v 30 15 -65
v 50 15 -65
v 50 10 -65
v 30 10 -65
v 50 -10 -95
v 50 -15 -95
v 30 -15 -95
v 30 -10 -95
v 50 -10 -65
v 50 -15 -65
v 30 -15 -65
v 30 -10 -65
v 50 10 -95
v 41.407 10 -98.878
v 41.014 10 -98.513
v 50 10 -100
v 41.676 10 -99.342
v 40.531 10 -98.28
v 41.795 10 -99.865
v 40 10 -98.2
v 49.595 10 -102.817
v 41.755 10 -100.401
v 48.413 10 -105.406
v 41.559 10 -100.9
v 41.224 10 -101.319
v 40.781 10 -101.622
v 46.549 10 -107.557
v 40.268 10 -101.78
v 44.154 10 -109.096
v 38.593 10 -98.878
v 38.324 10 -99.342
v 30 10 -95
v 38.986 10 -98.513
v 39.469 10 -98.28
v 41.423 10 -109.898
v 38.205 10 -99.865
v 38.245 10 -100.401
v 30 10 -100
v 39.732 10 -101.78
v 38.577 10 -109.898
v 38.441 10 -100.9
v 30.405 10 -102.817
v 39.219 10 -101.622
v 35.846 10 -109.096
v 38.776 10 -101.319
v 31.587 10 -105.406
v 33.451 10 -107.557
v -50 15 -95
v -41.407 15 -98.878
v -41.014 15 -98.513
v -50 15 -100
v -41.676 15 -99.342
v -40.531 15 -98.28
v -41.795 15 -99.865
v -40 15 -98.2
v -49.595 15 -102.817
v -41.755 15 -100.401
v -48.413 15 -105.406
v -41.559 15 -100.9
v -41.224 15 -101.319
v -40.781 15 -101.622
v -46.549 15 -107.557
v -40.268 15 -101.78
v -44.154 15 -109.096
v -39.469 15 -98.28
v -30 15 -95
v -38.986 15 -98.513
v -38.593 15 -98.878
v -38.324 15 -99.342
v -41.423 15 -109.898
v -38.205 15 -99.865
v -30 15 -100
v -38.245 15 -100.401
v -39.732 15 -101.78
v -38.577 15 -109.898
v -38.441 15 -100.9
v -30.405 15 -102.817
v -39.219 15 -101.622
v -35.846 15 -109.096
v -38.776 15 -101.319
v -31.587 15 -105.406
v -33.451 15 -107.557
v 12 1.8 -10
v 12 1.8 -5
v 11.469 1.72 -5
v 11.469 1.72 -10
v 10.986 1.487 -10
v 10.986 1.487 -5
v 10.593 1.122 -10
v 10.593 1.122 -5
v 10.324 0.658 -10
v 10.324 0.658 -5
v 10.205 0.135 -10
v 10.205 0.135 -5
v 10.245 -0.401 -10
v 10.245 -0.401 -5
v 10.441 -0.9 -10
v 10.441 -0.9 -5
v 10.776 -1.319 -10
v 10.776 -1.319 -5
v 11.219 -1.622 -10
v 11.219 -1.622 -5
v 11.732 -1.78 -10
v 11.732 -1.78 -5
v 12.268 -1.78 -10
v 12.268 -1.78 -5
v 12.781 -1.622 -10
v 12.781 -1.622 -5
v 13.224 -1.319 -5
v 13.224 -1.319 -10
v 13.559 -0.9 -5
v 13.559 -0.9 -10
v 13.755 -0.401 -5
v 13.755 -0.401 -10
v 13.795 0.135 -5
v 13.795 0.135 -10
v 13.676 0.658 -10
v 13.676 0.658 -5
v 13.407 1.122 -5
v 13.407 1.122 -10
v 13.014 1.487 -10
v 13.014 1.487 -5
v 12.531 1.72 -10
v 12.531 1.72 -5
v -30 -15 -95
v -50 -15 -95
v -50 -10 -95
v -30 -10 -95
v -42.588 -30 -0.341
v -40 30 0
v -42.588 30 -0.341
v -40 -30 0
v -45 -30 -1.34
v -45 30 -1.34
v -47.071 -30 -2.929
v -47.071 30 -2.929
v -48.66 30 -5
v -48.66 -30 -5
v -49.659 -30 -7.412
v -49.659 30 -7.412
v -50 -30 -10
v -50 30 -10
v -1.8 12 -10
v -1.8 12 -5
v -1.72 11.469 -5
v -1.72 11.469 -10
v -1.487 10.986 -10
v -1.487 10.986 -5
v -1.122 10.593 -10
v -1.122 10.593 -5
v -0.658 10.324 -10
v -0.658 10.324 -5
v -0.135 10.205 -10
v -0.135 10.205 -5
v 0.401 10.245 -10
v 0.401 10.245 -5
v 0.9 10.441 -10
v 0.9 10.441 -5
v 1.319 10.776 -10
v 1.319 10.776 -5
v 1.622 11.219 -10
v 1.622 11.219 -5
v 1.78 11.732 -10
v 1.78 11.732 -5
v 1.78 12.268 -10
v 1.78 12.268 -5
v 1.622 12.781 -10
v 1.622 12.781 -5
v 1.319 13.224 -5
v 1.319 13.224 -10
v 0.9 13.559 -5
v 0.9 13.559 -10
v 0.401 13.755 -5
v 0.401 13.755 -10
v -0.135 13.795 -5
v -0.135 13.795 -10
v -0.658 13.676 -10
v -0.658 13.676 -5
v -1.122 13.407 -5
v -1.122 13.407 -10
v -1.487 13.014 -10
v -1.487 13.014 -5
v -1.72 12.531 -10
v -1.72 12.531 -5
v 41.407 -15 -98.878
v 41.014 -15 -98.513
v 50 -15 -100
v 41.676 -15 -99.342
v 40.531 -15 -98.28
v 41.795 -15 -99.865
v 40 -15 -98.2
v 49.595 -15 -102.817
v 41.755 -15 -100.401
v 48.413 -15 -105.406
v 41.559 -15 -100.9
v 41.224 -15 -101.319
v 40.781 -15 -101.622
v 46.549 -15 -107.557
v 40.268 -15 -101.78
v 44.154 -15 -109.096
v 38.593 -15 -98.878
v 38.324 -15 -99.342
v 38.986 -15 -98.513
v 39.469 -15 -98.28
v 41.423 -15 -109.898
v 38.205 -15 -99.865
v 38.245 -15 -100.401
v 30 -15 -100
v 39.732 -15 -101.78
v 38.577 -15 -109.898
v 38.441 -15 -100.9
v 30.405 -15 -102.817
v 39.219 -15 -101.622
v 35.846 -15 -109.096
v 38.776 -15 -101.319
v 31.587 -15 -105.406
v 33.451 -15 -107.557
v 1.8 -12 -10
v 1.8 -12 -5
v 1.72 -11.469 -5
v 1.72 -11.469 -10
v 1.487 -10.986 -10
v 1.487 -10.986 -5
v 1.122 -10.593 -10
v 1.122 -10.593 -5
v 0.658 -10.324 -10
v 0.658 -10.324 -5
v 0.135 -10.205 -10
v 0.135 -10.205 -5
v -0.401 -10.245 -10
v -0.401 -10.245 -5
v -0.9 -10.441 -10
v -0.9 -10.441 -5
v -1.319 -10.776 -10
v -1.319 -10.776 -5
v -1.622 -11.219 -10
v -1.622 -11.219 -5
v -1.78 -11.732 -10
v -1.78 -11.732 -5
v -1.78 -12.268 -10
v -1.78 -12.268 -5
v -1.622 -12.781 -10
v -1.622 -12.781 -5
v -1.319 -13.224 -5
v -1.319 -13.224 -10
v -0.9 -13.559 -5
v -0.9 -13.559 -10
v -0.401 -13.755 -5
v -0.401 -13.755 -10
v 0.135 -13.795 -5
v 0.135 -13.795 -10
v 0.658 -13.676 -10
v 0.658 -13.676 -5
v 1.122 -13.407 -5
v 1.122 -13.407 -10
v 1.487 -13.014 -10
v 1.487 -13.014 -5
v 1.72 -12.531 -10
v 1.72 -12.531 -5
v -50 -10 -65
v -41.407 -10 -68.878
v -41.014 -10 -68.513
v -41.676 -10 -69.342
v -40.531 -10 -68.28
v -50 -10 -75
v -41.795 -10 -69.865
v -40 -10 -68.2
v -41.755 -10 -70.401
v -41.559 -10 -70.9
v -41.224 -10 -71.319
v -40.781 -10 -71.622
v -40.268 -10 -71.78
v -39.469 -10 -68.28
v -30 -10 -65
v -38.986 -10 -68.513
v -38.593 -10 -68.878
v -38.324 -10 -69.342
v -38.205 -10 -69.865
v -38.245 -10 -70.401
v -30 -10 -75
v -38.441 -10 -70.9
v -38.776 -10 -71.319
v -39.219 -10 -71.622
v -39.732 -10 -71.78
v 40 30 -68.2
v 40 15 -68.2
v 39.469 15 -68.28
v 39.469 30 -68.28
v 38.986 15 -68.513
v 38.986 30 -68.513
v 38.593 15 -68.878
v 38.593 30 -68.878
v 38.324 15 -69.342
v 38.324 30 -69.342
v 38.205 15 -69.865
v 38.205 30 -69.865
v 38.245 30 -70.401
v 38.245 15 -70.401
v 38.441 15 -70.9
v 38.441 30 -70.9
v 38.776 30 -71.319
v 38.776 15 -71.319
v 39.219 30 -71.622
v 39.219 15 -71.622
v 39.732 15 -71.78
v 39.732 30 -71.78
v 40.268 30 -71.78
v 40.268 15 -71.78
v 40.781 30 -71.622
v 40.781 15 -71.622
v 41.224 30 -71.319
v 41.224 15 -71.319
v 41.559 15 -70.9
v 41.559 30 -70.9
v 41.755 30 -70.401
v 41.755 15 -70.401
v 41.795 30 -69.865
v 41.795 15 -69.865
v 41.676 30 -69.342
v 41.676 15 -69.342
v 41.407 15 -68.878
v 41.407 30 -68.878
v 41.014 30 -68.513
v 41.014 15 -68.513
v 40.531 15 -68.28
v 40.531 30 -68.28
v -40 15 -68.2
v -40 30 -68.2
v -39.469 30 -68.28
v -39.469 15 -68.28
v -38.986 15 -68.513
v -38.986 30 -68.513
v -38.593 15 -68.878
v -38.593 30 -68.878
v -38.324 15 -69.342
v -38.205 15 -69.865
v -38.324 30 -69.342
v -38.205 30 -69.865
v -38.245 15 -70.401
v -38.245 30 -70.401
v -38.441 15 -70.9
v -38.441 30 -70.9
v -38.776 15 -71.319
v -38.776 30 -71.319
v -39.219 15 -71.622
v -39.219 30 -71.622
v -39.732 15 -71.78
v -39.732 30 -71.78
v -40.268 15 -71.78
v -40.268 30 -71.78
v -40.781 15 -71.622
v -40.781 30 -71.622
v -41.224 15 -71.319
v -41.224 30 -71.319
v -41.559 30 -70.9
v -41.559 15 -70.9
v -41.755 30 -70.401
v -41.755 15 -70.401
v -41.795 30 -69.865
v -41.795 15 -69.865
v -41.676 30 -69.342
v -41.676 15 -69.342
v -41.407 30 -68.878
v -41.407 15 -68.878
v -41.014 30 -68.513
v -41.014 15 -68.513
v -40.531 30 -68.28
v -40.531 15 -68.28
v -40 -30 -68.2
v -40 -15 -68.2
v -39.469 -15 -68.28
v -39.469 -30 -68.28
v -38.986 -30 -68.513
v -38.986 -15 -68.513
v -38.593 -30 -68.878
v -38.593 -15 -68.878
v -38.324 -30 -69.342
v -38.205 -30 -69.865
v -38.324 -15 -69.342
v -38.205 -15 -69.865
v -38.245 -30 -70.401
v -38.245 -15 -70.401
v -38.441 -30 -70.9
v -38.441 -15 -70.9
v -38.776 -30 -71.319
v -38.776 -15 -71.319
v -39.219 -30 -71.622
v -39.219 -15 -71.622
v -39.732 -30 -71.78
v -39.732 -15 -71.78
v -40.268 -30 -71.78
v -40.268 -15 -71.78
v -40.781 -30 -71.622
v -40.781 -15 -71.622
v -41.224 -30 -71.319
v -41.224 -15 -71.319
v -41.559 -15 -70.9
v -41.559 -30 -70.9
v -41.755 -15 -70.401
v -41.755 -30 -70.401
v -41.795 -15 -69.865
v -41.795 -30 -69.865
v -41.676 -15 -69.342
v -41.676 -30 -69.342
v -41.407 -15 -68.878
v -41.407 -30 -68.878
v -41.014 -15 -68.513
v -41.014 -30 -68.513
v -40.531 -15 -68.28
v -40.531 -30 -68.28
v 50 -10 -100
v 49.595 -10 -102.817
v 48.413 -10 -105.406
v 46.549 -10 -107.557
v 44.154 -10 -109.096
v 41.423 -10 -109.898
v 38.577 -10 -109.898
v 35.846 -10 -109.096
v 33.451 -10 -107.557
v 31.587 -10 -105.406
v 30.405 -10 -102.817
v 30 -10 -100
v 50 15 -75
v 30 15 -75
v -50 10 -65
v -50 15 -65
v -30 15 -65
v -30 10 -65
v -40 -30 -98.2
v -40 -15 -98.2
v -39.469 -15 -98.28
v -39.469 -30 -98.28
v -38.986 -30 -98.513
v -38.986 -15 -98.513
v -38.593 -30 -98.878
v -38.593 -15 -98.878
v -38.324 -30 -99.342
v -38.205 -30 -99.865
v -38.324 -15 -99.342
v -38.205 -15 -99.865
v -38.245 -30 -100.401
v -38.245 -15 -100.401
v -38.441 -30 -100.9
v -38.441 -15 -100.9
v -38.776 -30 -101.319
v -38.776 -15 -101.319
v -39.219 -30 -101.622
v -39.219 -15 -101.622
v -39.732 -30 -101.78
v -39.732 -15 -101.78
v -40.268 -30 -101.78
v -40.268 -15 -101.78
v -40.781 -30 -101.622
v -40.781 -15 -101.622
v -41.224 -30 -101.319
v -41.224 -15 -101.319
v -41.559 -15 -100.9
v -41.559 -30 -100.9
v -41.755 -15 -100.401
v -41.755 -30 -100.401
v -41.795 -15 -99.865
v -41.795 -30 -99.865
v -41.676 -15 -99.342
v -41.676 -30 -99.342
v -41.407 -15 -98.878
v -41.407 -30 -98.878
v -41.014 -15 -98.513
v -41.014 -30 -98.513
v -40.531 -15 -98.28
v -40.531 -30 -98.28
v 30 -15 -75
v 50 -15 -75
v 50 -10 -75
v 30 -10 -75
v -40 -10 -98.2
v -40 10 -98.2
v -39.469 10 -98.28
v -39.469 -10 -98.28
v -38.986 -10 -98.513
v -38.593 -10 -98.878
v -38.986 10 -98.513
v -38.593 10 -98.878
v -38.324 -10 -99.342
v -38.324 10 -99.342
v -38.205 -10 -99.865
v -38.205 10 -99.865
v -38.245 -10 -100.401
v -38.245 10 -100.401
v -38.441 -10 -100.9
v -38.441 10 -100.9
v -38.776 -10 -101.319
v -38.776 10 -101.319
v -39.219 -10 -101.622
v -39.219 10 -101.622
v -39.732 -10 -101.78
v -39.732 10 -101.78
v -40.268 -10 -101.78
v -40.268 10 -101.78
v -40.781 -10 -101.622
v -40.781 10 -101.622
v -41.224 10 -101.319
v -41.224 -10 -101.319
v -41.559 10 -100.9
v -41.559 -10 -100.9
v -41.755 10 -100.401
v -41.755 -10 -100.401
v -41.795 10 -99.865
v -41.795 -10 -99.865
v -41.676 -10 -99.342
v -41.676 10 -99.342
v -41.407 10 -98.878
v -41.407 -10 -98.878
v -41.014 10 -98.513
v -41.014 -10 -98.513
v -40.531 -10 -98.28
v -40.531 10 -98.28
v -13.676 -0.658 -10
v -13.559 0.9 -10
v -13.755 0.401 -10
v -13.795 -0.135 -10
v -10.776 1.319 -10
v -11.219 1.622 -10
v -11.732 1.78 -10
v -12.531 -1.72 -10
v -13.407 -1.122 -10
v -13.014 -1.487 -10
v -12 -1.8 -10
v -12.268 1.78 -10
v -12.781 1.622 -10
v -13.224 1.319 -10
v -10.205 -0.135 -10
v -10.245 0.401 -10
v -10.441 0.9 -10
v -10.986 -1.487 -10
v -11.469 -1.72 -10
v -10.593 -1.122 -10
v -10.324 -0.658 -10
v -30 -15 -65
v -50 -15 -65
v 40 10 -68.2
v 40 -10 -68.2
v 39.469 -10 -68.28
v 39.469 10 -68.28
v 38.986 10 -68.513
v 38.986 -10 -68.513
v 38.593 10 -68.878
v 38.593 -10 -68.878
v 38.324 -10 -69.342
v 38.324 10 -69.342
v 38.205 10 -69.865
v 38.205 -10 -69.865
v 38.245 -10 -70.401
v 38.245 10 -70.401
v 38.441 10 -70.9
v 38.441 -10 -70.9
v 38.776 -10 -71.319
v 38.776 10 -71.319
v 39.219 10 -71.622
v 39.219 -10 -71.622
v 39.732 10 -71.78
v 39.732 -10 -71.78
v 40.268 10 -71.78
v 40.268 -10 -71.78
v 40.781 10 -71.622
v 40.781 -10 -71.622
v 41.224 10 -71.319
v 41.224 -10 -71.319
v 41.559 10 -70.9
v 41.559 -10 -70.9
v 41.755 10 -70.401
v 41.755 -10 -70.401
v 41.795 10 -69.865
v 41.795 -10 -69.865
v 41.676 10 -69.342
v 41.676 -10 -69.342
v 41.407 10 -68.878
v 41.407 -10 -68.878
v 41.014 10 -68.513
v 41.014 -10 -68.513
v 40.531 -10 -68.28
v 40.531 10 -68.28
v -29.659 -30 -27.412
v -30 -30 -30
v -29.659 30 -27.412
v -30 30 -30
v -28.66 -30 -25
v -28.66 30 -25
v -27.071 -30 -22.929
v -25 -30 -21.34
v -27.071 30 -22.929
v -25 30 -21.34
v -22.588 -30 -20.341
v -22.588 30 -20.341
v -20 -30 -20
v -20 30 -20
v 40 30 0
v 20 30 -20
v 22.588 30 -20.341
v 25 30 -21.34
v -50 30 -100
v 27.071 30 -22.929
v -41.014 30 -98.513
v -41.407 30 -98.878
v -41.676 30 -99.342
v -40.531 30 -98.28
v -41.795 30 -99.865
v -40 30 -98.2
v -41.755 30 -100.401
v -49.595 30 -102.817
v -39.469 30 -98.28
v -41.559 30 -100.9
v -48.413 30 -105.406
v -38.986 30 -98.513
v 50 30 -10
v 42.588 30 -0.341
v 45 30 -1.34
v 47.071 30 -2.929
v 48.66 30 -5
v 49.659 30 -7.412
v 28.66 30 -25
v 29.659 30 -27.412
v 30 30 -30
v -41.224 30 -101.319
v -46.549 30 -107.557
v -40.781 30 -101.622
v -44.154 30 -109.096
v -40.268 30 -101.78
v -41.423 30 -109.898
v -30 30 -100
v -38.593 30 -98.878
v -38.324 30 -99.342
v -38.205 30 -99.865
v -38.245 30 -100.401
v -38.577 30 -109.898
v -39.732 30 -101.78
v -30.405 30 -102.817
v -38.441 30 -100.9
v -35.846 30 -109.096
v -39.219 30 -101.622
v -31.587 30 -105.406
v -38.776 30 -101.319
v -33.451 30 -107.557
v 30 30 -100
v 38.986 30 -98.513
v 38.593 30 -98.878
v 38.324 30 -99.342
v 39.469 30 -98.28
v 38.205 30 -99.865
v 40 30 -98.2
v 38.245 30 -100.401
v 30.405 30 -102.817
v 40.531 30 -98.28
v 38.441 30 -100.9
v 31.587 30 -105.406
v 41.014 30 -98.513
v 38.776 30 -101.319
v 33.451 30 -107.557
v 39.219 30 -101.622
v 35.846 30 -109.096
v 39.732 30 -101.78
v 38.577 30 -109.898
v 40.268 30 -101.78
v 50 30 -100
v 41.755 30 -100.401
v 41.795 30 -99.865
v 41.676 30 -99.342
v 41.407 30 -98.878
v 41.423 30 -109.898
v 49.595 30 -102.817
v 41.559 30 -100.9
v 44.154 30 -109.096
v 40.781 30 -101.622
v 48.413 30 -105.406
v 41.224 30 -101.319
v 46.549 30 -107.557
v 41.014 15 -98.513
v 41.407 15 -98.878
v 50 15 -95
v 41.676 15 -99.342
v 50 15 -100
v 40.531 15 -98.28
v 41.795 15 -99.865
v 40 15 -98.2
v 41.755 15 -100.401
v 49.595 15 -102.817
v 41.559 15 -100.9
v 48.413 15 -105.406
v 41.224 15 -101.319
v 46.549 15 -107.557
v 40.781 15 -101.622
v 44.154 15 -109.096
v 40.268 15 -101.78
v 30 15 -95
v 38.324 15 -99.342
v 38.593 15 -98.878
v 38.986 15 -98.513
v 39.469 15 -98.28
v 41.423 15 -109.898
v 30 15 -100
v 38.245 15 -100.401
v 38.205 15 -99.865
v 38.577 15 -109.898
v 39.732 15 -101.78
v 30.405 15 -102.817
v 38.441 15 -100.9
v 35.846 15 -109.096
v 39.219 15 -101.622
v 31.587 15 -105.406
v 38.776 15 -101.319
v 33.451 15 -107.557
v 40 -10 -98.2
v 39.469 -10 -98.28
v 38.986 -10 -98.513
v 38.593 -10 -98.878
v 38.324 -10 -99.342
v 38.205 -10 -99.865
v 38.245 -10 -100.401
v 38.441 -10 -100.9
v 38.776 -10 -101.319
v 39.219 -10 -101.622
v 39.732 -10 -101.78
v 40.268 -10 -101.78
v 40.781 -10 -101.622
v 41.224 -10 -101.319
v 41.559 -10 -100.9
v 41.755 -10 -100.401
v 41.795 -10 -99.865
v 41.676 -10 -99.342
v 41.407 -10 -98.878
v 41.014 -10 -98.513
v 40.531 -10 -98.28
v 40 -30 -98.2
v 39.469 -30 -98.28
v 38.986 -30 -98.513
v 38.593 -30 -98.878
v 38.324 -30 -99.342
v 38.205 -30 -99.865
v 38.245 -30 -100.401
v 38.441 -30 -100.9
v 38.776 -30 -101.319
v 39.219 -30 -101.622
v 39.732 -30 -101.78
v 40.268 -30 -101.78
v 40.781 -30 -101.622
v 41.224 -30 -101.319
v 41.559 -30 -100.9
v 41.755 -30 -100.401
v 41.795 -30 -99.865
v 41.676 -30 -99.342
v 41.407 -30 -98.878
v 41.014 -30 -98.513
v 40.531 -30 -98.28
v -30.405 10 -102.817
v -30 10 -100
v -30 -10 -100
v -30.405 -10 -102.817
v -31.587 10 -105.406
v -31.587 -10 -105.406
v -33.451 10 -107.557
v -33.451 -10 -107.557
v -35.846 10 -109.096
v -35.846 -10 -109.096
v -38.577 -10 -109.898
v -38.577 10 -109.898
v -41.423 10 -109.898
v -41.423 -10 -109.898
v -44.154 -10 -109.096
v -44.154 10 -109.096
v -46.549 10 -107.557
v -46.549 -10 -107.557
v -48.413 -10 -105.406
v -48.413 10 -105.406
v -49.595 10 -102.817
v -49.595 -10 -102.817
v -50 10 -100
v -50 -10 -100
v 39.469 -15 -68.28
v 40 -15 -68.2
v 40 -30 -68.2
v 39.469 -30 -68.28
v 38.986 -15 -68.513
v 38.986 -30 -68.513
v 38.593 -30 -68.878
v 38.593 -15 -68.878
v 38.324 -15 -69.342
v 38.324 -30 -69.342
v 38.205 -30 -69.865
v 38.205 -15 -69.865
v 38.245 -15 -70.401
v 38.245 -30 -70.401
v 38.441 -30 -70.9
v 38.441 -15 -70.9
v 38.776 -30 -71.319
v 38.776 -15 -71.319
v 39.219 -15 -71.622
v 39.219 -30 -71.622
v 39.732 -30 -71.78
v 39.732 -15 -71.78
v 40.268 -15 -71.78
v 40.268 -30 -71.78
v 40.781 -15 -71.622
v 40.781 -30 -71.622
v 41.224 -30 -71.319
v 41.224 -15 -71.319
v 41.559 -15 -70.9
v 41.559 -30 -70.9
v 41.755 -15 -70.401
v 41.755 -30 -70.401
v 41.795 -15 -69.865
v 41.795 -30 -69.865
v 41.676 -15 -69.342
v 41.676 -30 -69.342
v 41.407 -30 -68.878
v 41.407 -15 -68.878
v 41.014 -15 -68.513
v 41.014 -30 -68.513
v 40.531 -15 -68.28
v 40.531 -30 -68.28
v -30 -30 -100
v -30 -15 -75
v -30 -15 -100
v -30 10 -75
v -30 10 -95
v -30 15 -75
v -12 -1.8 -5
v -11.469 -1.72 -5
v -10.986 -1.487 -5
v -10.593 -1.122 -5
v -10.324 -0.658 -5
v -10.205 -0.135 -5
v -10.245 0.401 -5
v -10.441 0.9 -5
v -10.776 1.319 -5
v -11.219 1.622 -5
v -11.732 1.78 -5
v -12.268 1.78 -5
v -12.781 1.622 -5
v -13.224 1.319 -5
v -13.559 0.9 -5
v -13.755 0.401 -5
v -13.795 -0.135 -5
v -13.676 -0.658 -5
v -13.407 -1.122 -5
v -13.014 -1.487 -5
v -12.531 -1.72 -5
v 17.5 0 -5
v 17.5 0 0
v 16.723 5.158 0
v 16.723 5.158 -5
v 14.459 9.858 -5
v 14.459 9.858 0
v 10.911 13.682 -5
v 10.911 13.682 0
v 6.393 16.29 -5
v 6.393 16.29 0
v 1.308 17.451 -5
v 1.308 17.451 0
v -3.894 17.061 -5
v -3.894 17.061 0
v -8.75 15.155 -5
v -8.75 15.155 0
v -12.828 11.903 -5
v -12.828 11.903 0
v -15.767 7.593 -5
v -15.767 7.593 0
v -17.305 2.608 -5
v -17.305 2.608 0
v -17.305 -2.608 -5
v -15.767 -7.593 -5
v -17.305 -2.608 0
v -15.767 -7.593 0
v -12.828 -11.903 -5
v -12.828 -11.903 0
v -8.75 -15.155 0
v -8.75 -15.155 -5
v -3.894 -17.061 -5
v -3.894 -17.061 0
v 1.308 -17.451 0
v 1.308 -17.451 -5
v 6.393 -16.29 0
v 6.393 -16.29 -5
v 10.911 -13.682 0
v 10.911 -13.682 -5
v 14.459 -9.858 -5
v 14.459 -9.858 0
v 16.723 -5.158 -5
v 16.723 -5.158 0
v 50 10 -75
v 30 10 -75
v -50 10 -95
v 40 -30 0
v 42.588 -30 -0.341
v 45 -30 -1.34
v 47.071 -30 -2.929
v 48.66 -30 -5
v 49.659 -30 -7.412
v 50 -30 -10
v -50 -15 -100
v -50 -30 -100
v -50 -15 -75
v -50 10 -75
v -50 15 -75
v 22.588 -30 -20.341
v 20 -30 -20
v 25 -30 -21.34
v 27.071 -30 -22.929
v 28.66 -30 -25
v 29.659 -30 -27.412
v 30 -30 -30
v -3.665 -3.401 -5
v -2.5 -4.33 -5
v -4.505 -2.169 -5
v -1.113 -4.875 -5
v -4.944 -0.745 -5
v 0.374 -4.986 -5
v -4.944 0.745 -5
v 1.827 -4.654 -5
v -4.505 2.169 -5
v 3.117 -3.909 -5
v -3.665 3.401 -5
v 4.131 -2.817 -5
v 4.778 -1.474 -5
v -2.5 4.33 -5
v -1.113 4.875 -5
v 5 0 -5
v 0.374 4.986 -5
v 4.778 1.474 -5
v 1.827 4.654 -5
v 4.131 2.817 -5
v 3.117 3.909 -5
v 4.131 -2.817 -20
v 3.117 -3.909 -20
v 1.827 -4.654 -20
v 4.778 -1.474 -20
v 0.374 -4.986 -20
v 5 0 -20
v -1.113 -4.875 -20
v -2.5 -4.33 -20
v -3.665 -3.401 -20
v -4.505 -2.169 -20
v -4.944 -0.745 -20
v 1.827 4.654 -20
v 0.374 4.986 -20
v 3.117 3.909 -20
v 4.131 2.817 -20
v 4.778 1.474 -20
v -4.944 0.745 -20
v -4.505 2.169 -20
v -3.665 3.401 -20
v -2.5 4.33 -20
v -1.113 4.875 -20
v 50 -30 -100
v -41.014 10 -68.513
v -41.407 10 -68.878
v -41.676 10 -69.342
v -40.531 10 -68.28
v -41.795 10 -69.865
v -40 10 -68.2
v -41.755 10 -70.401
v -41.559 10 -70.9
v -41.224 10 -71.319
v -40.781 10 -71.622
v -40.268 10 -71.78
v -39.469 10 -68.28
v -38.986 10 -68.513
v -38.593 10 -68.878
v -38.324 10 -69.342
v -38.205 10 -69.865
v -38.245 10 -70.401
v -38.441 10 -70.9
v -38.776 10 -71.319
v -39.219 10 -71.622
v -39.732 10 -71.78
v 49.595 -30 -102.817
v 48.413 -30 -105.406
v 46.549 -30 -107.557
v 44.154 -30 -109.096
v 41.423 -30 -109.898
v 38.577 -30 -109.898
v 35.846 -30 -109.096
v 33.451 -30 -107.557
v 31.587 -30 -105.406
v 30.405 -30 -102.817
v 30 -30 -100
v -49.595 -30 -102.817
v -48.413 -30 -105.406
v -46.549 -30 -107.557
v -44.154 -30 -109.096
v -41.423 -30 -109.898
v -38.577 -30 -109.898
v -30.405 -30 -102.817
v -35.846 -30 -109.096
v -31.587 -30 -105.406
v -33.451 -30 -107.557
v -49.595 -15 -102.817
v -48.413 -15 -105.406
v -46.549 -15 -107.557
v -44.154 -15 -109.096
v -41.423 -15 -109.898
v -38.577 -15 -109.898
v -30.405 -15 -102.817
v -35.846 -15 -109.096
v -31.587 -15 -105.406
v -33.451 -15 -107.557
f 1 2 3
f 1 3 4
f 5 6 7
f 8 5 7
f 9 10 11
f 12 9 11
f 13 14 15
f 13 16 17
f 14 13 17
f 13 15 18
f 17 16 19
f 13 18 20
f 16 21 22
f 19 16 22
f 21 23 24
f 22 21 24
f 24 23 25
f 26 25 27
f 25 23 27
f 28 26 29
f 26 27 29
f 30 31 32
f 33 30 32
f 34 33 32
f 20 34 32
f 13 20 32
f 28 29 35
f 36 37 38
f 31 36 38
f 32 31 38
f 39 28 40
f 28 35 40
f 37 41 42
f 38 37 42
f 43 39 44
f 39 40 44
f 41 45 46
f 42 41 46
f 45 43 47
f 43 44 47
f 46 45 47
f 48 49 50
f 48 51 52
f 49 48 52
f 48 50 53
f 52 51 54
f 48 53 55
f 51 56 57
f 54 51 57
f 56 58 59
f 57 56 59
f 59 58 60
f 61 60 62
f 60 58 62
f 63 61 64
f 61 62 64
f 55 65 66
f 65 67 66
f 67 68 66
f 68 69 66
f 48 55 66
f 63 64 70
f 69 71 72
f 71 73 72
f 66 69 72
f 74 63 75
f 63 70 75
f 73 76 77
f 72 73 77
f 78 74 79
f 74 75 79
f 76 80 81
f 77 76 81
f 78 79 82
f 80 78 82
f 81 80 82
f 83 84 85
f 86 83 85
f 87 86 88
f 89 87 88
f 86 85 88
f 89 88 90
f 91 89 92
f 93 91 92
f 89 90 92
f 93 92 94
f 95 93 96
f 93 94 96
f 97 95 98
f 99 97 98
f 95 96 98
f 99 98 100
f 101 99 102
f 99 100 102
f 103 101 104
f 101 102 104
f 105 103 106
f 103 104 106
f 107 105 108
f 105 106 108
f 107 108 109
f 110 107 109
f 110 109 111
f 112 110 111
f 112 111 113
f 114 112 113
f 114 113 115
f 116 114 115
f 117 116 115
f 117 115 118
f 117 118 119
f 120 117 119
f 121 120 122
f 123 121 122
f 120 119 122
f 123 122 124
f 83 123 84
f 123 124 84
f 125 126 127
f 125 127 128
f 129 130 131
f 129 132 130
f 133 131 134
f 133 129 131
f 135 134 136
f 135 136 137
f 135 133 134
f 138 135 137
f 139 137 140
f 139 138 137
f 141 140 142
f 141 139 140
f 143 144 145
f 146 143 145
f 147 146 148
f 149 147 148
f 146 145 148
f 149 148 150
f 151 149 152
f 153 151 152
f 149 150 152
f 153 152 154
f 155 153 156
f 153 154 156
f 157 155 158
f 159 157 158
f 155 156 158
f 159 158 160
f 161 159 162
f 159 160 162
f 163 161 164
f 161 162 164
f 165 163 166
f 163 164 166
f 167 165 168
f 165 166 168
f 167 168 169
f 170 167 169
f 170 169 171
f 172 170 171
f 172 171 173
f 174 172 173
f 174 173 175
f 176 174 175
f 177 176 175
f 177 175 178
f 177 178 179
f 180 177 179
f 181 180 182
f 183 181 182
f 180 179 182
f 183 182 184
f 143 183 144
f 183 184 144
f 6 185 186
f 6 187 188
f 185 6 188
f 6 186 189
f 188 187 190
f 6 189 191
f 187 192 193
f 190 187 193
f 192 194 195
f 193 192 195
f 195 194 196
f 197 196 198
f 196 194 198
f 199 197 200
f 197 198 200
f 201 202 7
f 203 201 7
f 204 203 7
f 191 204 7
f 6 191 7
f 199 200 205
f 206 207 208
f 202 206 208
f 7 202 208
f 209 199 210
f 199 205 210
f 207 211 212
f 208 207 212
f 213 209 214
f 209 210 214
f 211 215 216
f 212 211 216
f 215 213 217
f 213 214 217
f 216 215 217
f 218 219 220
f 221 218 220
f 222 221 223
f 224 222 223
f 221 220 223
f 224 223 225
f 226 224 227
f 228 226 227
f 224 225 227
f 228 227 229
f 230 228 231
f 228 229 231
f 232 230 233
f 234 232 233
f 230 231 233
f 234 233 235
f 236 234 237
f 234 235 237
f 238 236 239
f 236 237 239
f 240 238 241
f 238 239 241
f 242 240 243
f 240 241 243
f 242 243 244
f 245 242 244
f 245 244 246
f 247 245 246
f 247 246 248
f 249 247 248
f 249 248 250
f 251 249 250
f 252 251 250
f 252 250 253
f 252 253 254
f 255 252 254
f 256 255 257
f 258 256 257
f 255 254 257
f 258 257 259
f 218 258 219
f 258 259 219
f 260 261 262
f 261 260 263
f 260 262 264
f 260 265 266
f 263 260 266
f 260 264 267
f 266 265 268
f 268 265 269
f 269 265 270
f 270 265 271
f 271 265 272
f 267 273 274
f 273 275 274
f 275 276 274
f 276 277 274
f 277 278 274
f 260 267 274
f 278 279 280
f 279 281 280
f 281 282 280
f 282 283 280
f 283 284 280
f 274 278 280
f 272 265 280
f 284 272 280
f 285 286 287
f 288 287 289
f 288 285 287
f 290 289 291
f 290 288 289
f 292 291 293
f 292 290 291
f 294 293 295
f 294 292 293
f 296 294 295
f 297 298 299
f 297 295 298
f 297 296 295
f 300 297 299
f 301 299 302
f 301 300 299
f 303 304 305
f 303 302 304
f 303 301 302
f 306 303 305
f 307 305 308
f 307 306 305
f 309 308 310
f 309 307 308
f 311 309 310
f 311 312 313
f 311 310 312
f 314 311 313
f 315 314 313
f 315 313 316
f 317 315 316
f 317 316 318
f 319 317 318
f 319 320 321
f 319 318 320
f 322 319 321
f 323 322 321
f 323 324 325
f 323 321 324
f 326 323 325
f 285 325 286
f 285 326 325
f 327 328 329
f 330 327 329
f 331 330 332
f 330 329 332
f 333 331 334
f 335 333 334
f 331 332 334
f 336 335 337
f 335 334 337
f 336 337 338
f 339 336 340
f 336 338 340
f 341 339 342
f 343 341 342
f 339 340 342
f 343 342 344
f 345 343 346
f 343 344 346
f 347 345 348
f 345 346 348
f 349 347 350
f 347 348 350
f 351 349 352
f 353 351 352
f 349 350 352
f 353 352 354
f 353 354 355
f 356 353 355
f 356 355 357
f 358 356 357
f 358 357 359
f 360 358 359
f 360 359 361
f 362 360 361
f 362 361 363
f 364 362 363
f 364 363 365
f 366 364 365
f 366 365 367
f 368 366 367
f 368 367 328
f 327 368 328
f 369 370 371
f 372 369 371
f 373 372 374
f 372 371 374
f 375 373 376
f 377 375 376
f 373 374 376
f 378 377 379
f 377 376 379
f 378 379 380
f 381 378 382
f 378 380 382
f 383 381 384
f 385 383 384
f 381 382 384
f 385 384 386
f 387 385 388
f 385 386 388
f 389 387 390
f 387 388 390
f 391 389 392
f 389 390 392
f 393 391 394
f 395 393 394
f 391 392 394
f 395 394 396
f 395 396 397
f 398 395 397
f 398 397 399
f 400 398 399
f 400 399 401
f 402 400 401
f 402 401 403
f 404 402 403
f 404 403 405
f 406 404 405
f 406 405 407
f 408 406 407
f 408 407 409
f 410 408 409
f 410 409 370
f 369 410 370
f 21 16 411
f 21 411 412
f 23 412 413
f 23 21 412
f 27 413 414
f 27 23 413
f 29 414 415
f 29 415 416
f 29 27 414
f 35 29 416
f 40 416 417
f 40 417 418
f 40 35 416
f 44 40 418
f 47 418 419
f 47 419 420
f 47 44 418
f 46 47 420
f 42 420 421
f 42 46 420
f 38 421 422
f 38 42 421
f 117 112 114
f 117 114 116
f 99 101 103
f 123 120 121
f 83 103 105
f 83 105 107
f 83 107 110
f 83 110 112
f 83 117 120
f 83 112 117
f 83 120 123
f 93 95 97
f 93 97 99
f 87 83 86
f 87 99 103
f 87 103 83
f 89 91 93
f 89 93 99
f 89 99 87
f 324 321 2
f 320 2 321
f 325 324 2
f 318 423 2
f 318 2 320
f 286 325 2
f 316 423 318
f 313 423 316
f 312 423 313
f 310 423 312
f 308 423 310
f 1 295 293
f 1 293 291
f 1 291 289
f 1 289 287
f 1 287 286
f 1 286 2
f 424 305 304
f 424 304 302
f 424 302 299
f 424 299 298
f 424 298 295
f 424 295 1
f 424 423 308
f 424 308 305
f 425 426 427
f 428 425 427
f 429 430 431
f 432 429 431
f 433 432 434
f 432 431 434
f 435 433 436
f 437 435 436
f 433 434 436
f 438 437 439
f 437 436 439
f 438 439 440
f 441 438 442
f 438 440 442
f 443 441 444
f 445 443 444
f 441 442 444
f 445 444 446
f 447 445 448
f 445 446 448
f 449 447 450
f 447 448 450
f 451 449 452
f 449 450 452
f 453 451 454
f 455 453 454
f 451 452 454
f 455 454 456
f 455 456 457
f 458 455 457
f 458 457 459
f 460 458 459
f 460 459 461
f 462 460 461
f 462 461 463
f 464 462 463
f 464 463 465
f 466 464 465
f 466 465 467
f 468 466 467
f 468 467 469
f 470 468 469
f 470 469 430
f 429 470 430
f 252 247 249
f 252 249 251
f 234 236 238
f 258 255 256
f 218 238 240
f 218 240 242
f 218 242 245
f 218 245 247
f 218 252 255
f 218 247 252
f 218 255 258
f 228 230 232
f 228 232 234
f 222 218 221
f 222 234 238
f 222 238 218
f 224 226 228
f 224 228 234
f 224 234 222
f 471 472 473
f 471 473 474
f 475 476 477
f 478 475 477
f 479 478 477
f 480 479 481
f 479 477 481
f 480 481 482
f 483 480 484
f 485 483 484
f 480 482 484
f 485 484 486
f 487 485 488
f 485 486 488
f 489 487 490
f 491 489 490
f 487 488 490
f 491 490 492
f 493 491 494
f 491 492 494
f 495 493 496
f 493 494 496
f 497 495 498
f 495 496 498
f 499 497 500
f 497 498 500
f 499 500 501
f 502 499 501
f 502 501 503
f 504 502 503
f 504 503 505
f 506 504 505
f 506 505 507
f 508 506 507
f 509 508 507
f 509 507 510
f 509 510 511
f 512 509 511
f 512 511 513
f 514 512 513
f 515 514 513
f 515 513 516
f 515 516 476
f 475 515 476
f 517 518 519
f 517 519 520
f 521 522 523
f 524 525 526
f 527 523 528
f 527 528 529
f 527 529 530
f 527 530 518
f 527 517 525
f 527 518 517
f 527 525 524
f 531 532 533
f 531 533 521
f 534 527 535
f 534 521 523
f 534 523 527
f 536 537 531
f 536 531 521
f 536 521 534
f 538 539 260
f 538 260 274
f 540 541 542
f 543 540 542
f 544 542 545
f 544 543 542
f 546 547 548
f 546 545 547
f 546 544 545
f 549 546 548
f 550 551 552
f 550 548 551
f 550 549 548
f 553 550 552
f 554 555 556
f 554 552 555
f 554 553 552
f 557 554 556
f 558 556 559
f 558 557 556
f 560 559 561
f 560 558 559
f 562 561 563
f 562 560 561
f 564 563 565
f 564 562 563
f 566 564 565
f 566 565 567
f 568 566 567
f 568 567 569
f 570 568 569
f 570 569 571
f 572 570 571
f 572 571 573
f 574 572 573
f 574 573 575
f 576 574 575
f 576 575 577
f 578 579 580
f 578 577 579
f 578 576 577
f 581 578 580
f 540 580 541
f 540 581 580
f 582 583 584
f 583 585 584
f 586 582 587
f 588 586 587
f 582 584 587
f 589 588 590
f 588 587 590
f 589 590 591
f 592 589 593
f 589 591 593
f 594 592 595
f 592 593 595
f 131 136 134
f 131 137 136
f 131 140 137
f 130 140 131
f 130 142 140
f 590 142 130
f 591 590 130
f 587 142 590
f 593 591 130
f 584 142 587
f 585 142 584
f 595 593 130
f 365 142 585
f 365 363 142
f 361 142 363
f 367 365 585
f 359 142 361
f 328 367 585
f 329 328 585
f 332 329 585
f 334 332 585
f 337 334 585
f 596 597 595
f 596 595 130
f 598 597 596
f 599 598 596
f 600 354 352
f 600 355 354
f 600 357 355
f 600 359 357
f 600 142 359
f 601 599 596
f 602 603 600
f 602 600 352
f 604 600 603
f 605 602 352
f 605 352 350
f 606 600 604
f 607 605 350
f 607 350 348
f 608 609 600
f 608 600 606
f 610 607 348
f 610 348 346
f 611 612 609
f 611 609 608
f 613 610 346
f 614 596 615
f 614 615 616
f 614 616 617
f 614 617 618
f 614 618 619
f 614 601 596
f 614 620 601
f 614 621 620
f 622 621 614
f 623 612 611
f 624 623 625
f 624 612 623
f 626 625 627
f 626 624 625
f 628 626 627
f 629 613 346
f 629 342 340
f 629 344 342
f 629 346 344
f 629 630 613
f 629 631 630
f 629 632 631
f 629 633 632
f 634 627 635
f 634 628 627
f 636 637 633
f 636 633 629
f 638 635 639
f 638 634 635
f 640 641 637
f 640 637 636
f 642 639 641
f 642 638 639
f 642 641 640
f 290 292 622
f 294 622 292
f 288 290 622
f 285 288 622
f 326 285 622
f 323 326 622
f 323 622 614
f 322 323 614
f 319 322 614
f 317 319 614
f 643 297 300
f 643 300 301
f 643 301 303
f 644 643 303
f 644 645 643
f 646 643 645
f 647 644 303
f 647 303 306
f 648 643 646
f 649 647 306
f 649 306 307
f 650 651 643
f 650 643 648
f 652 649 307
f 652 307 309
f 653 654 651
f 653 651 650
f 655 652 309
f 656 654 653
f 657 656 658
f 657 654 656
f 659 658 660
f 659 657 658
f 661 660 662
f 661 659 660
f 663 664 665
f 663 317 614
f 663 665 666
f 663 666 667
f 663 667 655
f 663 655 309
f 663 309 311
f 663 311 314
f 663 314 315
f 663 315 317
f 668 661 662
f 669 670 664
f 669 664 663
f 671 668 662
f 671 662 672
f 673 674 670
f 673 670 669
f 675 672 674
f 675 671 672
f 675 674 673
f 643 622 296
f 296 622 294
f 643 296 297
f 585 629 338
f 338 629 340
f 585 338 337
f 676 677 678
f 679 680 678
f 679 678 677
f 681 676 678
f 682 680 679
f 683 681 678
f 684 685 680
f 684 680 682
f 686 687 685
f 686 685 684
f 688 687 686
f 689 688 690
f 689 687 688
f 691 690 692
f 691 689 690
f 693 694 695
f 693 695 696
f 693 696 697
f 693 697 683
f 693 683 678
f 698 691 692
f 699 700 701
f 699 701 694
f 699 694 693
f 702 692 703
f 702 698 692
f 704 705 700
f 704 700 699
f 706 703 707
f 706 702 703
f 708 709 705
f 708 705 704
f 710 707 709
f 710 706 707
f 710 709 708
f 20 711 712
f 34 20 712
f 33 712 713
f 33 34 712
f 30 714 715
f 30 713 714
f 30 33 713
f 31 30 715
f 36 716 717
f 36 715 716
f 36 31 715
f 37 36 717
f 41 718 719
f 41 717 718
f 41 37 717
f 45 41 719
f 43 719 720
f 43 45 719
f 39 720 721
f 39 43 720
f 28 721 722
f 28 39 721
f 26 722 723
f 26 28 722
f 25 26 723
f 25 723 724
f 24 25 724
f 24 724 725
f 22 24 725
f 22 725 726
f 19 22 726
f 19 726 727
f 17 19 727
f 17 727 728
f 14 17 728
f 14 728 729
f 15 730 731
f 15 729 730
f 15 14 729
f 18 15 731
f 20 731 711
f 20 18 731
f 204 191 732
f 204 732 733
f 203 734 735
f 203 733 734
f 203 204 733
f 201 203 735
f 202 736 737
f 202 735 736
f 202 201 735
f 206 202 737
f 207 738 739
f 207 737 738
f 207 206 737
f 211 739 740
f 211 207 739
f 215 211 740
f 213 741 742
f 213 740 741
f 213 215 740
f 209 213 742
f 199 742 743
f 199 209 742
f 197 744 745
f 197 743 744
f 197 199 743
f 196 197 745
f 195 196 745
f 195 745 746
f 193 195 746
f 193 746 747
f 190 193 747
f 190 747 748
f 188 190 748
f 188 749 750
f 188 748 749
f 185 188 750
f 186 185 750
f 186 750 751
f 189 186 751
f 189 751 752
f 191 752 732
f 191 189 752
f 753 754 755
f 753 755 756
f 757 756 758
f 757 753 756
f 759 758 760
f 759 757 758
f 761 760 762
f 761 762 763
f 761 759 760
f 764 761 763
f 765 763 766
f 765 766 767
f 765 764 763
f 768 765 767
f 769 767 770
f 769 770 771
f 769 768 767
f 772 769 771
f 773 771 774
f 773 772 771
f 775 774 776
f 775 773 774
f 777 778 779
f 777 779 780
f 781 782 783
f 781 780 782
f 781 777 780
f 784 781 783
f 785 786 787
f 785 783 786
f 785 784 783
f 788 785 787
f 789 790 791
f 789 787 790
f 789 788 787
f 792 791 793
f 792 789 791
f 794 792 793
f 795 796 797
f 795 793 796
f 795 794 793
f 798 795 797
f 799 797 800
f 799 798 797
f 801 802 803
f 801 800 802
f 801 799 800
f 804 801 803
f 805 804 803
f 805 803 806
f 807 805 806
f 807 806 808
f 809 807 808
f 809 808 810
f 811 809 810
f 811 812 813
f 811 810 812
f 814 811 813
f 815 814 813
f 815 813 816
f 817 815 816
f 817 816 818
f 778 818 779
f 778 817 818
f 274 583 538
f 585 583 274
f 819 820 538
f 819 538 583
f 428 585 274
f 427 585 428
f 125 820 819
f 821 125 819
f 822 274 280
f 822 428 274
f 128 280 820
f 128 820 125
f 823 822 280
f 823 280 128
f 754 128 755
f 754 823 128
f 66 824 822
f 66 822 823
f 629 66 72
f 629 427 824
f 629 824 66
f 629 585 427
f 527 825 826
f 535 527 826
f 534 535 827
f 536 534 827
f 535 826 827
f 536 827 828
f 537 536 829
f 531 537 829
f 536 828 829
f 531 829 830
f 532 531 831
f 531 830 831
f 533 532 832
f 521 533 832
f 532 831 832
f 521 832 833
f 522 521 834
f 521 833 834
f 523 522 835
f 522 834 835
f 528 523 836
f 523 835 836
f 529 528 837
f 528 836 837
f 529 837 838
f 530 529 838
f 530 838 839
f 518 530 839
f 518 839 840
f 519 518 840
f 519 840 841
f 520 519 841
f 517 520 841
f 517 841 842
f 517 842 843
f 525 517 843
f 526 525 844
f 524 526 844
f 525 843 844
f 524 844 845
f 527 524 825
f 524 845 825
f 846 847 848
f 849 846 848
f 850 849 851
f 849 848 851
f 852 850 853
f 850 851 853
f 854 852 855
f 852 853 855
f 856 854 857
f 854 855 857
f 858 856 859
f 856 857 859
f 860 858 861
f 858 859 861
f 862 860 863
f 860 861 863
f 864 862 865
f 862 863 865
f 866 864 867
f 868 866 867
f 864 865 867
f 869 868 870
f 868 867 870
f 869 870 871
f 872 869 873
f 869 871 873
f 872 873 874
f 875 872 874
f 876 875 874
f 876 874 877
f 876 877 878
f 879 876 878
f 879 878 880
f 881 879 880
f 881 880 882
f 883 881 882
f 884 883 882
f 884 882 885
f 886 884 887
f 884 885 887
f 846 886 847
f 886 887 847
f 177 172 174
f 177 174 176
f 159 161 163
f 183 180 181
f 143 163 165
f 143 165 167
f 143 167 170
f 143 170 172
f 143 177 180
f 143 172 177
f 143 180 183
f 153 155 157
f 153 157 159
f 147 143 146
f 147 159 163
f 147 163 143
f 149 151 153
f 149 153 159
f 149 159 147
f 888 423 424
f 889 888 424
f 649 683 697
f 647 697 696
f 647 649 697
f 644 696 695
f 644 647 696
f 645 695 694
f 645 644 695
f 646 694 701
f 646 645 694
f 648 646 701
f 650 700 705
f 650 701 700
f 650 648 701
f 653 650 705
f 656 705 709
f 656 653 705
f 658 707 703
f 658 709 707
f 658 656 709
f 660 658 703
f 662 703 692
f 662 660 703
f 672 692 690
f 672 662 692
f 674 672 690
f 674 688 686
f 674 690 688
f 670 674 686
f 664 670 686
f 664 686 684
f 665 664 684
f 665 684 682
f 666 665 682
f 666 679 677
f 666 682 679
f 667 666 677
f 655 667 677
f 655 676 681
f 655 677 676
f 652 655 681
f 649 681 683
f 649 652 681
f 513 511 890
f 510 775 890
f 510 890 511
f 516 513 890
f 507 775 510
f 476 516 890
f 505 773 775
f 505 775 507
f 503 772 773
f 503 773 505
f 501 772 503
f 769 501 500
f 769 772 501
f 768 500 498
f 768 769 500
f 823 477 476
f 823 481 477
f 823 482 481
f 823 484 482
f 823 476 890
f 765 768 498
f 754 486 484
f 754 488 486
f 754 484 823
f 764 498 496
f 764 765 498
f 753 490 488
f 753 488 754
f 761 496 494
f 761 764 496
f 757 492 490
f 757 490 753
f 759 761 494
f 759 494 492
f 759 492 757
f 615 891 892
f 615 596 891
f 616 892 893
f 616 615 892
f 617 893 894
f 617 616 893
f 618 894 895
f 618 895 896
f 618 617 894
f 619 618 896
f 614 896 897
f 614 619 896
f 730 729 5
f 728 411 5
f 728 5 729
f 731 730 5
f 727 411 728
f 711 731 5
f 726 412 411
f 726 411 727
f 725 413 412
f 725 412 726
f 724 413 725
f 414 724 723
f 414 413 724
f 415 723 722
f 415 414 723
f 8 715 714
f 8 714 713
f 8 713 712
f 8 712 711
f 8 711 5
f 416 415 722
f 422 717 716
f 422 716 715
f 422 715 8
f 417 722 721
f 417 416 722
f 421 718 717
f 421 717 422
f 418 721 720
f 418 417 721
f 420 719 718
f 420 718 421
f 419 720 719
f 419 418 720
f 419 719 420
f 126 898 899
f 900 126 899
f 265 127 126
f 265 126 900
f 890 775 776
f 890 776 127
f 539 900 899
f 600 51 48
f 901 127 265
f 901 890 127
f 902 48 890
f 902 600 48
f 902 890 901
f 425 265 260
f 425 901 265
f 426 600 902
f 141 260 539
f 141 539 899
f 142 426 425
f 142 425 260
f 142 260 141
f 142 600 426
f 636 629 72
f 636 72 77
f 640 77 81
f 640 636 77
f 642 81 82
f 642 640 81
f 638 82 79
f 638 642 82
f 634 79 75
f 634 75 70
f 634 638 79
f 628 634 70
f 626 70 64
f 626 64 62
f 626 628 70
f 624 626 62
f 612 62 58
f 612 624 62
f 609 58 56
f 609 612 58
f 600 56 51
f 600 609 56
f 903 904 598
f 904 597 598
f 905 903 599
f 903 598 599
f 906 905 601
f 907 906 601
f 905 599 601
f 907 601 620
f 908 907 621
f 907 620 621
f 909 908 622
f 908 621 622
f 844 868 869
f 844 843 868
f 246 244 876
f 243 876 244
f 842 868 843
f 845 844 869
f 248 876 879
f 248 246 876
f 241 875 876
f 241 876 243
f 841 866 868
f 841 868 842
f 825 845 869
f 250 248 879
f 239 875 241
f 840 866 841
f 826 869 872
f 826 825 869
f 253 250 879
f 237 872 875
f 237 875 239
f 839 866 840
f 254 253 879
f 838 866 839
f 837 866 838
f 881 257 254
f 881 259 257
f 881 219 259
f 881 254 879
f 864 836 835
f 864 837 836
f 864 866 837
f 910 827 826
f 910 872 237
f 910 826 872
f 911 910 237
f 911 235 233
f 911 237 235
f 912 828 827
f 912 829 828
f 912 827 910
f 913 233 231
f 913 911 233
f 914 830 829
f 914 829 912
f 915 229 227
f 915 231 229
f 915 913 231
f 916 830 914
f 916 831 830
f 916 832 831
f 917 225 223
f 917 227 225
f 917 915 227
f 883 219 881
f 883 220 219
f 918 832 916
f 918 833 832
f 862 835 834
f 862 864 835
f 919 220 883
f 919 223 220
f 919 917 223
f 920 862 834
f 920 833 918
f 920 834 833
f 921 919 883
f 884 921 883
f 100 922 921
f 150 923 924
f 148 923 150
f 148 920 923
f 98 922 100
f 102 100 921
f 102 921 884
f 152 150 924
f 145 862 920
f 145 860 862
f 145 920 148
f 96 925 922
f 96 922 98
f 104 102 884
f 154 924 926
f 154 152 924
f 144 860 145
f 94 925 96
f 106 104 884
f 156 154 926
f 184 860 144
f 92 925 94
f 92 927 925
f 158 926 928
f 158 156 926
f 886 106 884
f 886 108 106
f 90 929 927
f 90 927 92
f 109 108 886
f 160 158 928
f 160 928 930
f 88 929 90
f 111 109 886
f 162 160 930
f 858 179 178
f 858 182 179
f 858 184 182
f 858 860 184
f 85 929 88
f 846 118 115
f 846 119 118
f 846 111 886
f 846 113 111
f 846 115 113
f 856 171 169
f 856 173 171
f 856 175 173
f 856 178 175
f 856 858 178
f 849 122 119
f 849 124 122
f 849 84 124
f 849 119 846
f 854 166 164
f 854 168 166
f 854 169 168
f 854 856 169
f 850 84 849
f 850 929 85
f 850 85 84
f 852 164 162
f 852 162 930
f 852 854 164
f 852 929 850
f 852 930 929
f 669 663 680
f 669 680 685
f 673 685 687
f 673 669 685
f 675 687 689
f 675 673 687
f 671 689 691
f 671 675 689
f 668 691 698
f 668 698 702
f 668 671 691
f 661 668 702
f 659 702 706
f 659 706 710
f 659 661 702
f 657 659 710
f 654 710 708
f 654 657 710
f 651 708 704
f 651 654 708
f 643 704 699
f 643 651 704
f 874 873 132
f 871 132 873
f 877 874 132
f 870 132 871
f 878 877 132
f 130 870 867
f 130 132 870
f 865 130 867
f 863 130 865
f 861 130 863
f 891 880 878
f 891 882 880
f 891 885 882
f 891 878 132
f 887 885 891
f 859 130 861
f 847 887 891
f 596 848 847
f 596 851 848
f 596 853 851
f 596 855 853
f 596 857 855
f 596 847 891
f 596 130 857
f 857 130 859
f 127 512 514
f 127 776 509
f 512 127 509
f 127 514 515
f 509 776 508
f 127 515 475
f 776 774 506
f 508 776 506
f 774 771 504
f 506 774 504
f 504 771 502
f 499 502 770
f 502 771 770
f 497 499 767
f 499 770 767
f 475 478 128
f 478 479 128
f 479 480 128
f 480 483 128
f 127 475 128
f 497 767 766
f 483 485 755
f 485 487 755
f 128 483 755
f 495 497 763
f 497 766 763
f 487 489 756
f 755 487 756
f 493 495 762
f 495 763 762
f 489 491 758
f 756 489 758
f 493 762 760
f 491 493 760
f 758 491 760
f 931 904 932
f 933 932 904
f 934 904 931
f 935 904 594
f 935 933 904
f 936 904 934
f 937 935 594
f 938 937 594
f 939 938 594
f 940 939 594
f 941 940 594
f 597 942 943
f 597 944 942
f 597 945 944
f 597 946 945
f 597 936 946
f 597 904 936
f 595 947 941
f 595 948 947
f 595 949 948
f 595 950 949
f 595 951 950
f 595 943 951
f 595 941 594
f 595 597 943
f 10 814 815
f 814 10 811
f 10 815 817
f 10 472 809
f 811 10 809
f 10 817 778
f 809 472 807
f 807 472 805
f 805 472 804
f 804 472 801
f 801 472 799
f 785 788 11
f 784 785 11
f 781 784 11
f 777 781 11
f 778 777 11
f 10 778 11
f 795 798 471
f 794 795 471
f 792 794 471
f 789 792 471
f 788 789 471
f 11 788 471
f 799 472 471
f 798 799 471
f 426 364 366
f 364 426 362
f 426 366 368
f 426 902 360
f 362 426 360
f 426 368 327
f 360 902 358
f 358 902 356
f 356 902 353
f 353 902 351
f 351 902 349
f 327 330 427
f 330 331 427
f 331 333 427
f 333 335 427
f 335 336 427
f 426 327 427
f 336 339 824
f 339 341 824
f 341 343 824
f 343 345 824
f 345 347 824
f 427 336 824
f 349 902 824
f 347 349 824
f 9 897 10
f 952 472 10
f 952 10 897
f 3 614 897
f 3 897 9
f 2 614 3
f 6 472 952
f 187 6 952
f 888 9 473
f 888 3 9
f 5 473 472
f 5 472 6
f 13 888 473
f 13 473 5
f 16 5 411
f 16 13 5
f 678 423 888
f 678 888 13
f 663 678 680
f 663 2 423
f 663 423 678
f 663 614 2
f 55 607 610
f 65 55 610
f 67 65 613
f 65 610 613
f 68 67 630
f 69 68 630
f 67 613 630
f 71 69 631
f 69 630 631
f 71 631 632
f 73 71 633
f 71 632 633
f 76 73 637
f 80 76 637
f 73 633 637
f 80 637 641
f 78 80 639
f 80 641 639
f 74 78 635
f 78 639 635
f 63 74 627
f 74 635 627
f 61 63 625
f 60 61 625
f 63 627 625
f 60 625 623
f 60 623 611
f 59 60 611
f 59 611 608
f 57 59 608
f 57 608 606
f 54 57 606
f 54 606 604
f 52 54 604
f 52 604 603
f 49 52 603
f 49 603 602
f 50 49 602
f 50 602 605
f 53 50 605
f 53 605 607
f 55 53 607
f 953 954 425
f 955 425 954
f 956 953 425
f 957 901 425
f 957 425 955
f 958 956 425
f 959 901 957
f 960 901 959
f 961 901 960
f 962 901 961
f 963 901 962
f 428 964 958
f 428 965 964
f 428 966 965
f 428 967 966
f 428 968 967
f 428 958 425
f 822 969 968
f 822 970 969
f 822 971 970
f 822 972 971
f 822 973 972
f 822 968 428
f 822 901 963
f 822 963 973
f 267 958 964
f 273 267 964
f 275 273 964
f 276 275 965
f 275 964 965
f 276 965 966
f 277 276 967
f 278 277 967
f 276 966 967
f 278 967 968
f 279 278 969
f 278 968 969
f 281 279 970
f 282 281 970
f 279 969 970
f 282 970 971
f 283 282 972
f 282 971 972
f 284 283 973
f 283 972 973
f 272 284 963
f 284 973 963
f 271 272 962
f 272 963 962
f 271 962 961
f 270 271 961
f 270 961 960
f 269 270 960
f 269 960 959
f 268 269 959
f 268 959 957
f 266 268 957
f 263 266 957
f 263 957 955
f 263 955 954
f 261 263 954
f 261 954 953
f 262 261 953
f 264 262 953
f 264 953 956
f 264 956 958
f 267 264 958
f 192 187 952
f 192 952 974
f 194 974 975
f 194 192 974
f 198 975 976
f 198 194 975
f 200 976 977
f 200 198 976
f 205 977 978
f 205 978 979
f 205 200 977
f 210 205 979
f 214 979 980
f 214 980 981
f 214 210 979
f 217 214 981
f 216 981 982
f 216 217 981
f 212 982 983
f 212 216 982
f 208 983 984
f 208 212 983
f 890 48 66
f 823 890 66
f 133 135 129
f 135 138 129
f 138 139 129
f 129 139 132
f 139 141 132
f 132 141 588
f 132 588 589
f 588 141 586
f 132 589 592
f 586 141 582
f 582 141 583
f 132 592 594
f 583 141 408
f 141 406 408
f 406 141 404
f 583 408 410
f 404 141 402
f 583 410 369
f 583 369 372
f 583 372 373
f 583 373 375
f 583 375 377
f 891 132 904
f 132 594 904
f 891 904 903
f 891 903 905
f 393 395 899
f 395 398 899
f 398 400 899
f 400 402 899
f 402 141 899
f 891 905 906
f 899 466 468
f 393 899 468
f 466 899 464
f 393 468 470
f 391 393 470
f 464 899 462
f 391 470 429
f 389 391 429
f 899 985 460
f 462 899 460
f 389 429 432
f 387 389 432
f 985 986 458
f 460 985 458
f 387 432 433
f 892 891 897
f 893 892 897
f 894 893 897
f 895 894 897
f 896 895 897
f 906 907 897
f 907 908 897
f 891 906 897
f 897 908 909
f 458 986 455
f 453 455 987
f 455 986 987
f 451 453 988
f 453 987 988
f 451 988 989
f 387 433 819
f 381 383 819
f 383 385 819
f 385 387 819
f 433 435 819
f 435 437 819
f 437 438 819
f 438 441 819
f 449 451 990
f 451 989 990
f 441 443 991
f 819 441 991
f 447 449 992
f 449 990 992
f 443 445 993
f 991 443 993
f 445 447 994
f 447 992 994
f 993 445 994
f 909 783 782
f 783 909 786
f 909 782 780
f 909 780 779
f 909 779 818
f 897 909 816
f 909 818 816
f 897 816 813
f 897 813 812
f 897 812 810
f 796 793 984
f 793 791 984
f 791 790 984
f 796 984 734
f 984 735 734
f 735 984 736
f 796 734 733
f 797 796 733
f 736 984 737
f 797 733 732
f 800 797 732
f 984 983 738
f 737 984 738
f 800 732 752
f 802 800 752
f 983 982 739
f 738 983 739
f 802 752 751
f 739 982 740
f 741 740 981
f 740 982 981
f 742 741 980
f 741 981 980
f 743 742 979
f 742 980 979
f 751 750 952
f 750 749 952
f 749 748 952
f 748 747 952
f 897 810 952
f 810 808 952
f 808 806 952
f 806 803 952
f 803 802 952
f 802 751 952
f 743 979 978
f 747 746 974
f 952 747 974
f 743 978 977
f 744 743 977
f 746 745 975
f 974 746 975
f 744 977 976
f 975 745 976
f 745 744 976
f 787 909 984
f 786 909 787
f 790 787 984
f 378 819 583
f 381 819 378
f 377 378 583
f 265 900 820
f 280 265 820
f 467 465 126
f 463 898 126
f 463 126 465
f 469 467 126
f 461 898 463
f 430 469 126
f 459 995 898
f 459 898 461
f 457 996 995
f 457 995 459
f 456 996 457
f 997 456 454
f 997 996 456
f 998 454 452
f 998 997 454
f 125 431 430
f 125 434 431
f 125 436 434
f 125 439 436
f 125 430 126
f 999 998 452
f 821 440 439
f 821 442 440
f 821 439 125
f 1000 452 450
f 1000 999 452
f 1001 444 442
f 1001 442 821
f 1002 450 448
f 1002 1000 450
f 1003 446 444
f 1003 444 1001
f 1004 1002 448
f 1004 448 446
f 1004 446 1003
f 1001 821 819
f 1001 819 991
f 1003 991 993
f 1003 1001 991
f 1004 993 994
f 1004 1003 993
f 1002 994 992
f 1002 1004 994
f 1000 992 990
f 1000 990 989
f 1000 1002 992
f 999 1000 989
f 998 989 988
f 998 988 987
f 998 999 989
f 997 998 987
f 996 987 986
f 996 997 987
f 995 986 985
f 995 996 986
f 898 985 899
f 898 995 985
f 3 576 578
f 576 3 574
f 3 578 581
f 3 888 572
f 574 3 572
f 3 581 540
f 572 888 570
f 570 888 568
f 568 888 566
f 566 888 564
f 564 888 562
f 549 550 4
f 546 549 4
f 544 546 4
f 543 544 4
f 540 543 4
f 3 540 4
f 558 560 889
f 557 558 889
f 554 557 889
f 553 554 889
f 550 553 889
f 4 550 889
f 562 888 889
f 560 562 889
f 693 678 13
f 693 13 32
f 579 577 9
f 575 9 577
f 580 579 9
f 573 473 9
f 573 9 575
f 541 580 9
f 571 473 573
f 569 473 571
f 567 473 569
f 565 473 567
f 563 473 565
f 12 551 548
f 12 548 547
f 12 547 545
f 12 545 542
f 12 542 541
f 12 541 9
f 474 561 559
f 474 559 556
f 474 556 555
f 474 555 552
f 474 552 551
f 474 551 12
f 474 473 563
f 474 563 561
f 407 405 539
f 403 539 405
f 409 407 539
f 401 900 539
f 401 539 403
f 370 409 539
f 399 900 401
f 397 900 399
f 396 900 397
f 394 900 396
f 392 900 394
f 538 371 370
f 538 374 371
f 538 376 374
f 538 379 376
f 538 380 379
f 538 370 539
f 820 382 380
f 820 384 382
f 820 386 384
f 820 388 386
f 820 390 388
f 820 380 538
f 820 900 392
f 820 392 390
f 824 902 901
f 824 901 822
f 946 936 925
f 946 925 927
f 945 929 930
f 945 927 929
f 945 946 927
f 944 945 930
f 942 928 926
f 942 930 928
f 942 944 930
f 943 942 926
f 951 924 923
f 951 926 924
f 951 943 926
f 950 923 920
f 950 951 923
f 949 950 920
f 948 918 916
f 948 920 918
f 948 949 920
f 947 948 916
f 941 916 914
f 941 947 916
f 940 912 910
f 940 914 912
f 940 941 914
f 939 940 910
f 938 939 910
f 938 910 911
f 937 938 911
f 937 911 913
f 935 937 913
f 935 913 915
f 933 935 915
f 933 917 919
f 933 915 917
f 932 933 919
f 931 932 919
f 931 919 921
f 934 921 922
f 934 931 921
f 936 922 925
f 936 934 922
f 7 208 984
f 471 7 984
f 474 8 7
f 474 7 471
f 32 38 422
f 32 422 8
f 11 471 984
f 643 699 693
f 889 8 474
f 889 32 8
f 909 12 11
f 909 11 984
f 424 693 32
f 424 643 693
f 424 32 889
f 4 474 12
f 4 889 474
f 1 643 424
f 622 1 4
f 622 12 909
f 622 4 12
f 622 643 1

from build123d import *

# Parameters (mm, degrees)
BOSS_EXTRUDE1_DEPTH     = 30
FILLET1_R               = 10
CUT_EXTRUDE1_DEPTH      = 125.49899598
CUT_EXTRUDE1_DEPTH_BACK = 125.49899598
SKETCH3_R               = 5
SKETCH4_R               = 17.5
CUT_EXTRUDE2_DEPTH      = 5
SKETCH5_R               = 1.8
CUT_EXTRUDE3_DEPTH      = 5
CIRPATTERN1_COUNT       = 4
SKETCH6_R               = 1.8
CUT_EXTRUDE4_DEPTH      = 135.907375632
SKETCH7_W               = 20
SKETCH7_H               = 10
CUT_EXTRUDE5_DEPTH      = 5
MIRROR2_COPY_1_SKETCH_W = 20
MIRROR2_COPY_1_SKETCH_H = 10
MIRROR2_COPY_1_DEPTH    = 5


with BuildPart() as part:
    # Sketch1 → Boss-Extrude1 (new, symmetric)
    with BuildSketch(Plane(origin=(0, 0, 0), x_dir=(1, 0, 0), z_dir=(0, 1, 0))):
        with BuildLine():
            Line((-50, 0), (50, 0))
            Line((50, 0), (50, 100))
            ThreePointArc((50, 100), (40, 110), (30, 100))
            Line((30, 100), (30, 20))
            Line((30, 20), (-30, 20))
            Line((-30, 20), (-30, 100))
            ThreePointArc((-30, 100), (-40, 110), (-50, 100))
            Line((-50, 100), (-50, 0))
        make_face()
    extrude(amount=BOSS_EXTRUDE1_DEPTH, both=True)

    # Fillet1
    fillet1_edges = [part.edges().sort_by_distance(p)[0] for p in [
        (50, 0, 0),
        (-50, 0, 0),
        (-30, 0, -20),
        (30, 0, -20),
    ]]
    fillet(fillet1_edges, radius=FILLET1_R)

    # Sketch3 → Cut-Extrude1 (cut, two sides: drawn at the far end of the back side and taken through both)
    with BuildSketch(Plane.XY.offset(-CUT_EXTRUDE1_DEPTH_BACK)):
        Circle(SKETCH3_R)
    extrude(amount=CUT_EXTRUDE1_DEPTH + CUT_EXTRUDE1_DEPTH_BACK, mode=Mode.SUBTRACT)

    # Sketch4 → Cut-Extrude2 (cut)
    with BuildSketch(Plane.XY):
        Circle(SKETCH4_R)
    extrude(amount=-CUT_EXTRUDE2_DEPTH, mode=Mode.SUBTRACT)

    # Sketch5 → Cut-Extrude3 (cut)
    with BuildSketch(Plane.XY.offset(-5)):
        with Locations((0, -12)):
            Circle(SKETCH5_R)
    cut_extrude3 = extrude(amount=-CUT_EXTRUDE3_DEPTH, mode=Mode.SUBTRACT)

    # CirPattern1: Cut-Extrude3 ×4 about axis
    cirpattern1_axis = Axis((0, 0, 0), (0, 0, 1))
    for i in range(1, CIRPATTERN1_COUNT):
        add(cut_extrude3.rotate(cirpattern1_axis, i * 360 / CIRPATTERN1_COUNT), mode=Mode.SUBTRACT)

    # Sketch6 → Cut-Extrude4 (cut, through all)
    with BuildSketch(Plane(origin=(0, 30, 0), x_dir=(1, 0, 0), z_dir=(0, 1, 0))):
        with Locations(Location((-40, 100, 0), (0, 0, 270))):
            Circle(SKETCH6_R)
        with Locations(Location((-40, 70, 0), (0, 0, 270))):
            Circle(SKETCH6_R)
    cut_extrude4 = extrude(amount=-CUT_EXTRUDE4_DEPTH, mode=Mode.SUBTRACT)

    # Sketch7 → Cut-Extrude5 (cut)
    with BuildSketch(Plane(origin=(0, 15, 0), x_dir=(1, 0, 0), z_dir=(0, 1, 0))):
        with BuildLine():
            Line((-50, 105), (-50, 95))
            Line((-50, 95), (-30, 95))
            Line((-30, 95), (-30, 105))
            ThreePointArc((-30, 105), (-40, 115), (-50, 105))
        make_face()
        with Locations((-40, 70)):
            Rectangle(SKETCH7_W, SKETCH7_H)
    cut_extrude5 = extrude(amount=-CUT_EXTRUDE5_DEPTH, mode=Mode.SUBTRACT)

    # Mirror1: Cut-Extrude5 across plane
    add(cut_extrude5.mirror(Plane.ZX), mode=Mode.SUBTRACT)

    # Mirror2: Cut-Extrude4, Cut-Extrude5 across plane
    add(cut_extrude4.mirror(Plane(origin=(0, 0, 0), x_dir=(0, 0, 1), z_dir=(1, 0, 0))), mode=Mode.SUBTRACT)
    add(cut_extrude5.mirror(Plane(origin=(0, 0, 0), x_dir=(0, 0, 1), z_dir=(1, 0, 0))), mode=Mode.SUBTRACT)

    # Mirror2 copy 1 sketch → Mirror2 copy 1 (cut)
    with BuildSketch(Plane(origin=(0, -15, 0), x_dir=(-1, 0, 0), z_dir=(0, -1, 0))):
        with BuildLine():
            Line((-50, 105), (-50, 95))
            Line((-50, 95), (-30, 95))
            Line((-30, 95), (-30, 105))
            ThreePointArc((-30, 105), (-40, 115), (-50, 105))
        make_face()
        with Locations((-40, 70)):
            Rectangle(MIRROR2_COPY_1_SKETCH_W, MIRROR2_COPY_1_SKETCH_H)
    extrude(amount=-MIRROR2_COPY_1_DEPTH, mode=Mode.SUBTRACT)


solid = part.part
